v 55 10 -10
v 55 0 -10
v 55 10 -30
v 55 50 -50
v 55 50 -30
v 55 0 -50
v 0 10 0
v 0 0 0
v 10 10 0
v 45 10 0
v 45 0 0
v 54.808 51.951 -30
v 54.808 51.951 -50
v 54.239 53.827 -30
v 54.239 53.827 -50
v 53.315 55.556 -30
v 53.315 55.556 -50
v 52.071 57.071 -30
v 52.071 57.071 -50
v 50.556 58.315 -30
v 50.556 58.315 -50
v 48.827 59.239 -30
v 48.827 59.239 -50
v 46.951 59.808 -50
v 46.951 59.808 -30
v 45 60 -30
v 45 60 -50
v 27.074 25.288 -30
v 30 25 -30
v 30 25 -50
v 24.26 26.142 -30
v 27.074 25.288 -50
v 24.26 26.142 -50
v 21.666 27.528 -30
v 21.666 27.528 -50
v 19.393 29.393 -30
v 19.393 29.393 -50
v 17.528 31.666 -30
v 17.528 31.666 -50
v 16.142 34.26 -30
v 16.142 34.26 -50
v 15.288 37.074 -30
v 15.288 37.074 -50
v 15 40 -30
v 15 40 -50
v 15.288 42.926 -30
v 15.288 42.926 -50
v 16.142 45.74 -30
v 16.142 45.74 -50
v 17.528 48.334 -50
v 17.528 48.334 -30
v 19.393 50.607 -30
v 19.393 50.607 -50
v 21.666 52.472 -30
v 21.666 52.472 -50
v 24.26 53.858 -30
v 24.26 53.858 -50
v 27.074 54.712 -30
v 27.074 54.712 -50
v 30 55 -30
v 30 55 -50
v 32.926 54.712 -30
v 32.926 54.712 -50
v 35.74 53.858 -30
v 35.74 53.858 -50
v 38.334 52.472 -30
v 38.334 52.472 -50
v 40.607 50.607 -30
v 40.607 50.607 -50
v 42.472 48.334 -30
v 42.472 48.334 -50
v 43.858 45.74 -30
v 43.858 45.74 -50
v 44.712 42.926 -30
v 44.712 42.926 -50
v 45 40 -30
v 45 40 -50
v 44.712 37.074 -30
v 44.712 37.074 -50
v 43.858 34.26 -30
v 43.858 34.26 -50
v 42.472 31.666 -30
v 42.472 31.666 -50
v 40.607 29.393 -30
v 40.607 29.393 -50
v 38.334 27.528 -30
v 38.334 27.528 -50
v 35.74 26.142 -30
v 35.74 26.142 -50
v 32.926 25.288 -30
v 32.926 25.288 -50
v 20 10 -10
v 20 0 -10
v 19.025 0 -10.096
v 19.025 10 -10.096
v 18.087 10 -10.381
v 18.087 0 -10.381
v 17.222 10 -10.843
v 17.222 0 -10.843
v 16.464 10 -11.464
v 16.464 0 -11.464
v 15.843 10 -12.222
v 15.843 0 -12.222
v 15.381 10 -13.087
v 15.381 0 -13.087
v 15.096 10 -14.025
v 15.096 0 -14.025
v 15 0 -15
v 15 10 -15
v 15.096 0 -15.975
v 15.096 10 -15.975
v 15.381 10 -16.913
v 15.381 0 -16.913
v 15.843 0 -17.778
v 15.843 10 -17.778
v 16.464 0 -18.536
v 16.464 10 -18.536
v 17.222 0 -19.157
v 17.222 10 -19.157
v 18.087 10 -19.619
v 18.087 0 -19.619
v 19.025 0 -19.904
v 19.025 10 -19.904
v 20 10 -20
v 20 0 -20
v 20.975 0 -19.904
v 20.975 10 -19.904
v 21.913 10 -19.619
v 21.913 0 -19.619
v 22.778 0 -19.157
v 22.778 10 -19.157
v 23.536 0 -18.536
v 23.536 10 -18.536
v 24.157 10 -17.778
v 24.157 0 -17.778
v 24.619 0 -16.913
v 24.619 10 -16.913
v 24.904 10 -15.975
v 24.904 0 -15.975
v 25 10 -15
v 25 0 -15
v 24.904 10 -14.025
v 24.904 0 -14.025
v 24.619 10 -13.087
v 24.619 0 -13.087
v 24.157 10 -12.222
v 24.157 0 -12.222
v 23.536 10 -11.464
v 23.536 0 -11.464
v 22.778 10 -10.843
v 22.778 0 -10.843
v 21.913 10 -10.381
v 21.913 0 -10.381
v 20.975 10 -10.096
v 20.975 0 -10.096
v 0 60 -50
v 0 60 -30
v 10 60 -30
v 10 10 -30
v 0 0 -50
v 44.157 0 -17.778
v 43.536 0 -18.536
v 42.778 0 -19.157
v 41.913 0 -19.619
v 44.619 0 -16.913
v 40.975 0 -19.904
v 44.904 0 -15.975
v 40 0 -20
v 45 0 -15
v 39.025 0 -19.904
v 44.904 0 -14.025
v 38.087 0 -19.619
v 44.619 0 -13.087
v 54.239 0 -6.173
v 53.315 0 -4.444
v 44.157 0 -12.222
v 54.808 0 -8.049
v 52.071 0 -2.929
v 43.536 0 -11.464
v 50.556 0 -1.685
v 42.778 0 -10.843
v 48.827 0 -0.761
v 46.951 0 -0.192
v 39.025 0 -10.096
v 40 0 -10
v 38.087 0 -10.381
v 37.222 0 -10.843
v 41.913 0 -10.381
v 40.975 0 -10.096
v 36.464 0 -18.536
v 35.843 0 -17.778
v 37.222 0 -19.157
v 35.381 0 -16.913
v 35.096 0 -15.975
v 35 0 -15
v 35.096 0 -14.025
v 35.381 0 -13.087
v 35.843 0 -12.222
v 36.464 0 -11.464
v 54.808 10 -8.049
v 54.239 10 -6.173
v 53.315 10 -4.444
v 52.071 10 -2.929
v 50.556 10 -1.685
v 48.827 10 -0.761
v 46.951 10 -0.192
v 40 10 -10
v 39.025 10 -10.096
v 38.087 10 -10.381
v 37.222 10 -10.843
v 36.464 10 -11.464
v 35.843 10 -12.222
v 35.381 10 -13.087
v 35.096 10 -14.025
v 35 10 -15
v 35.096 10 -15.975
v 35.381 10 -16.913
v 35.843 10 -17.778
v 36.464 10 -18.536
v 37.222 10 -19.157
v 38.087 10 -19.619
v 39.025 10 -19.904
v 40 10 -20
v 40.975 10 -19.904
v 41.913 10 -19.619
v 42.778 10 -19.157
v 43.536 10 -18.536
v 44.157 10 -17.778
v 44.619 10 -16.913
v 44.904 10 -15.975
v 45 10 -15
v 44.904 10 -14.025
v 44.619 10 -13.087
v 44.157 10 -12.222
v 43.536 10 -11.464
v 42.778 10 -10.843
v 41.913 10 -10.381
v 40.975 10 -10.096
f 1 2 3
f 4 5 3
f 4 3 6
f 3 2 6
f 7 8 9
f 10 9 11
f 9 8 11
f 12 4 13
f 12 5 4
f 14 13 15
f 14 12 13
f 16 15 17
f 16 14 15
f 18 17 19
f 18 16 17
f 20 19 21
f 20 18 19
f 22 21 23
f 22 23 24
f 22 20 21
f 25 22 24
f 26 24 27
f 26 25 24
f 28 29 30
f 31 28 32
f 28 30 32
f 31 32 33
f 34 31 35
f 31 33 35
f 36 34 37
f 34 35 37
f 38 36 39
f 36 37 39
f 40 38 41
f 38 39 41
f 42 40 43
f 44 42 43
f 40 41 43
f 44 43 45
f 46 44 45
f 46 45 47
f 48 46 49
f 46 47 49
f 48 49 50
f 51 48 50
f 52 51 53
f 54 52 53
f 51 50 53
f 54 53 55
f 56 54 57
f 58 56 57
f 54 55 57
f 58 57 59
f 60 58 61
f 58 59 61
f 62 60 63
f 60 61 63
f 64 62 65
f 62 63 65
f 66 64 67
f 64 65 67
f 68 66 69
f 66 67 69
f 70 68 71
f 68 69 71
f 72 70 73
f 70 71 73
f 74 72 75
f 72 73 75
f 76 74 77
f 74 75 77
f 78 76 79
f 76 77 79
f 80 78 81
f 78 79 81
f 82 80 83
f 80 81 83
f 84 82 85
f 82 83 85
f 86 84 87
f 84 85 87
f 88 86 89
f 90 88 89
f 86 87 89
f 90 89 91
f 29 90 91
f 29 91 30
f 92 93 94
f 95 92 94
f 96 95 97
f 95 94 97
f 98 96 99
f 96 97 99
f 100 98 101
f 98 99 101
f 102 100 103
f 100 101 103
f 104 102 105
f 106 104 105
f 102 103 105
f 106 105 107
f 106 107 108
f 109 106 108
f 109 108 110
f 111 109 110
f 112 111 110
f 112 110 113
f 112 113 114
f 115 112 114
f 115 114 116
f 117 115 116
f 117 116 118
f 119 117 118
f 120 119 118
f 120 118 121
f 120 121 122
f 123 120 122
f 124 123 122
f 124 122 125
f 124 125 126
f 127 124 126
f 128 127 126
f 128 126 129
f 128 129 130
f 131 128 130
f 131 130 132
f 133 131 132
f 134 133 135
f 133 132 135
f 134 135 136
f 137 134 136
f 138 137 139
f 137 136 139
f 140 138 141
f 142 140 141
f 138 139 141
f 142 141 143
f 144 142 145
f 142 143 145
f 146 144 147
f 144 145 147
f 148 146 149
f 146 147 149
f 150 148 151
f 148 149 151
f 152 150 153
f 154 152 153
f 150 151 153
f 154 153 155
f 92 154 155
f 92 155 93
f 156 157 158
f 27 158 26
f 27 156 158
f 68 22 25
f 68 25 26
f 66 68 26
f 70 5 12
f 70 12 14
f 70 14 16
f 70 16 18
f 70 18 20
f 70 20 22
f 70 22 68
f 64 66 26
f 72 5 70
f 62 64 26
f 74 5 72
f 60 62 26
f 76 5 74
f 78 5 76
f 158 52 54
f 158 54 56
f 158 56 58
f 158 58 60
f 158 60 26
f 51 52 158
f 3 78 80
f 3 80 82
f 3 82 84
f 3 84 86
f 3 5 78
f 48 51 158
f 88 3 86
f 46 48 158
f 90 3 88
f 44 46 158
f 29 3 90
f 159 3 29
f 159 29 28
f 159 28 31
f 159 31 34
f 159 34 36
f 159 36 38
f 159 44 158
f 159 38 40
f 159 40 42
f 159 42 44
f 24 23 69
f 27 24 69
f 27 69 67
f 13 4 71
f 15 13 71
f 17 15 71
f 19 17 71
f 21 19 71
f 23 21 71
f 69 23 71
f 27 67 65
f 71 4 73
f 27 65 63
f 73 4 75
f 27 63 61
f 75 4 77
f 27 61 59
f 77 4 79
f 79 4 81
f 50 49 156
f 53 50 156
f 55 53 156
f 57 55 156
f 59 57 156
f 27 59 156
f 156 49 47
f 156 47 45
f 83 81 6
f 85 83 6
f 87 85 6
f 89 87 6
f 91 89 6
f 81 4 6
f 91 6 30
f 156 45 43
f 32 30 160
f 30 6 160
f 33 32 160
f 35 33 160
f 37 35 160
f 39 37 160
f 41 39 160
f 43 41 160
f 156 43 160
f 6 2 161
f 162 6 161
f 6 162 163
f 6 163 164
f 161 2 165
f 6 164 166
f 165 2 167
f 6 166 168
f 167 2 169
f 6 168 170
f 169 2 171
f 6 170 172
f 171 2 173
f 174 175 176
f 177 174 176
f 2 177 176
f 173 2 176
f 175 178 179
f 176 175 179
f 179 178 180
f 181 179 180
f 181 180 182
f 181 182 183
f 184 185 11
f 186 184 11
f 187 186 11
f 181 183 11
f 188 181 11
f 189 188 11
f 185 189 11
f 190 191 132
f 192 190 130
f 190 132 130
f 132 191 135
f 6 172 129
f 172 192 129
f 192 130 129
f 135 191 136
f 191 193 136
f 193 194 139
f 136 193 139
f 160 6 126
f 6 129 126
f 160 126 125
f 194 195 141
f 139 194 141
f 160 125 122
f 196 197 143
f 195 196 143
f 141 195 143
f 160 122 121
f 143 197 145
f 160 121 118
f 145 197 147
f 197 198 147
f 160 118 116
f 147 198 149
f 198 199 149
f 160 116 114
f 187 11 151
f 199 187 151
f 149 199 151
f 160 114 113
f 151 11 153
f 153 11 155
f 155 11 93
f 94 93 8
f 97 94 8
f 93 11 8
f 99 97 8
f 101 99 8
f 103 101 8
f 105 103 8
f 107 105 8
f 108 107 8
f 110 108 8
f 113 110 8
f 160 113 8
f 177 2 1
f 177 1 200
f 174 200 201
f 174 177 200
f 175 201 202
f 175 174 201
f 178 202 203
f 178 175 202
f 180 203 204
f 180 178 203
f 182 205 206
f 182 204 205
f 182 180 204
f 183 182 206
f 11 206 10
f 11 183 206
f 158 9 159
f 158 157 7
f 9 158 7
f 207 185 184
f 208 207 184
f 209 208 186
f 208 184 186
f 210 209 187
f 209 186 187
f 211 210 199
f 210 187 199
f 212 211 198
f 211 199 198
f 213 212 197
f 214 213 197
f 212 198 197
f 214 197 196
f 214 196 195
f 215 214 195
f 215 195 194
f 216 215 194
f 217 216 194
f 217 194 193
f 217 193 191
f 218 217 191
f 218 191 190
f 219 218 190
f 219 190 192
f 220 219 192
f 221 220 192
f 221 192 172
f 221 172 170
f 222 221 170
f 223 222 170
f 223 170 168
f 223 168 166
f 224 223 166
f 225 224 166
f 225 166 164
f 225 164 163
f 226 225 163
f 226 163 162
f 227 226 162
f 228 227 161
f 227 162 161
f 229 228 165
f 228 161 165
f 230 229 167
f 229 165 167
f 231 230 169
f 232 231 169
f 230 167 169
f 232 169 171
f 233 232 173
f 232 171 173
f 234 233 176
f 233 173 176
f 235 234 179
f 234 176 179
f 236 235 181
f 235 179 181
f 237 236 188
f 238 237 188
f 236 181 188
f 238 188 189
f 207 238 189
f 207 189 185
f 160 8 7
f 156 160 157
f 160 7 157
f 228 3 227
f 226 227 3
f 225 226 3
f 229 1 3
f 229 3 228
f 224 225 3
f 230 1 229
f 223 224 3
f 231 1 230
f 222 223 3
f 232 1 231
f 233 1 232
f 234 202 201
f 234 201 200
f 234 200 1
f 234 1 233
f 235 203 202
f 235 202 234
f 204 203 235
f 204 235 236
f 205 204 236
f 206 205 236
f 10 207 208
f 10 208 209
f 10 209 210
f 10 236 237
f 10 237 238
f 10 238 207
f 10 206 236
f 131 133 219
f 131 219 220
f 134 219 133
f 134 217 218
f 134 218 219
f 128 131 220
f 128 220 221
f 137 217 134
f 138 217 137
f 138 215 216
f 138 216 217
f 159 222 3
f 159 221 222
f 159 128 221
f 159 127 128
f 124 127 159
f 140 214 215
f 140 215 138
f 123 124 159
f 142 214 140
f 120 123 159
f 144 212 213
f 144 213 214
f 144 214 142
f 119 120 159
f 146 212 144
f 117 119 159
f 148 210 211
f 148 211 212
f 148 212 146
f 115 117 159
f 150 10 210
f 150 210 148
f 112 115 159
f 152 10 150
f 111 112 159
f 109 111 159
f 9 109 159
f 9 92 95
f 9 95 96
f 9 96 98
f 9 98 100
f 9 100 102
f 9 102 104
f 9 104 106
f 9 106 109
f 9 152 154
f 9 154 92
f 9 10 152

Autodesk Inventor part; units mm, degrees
ref_plane "YZ Plane" through (0, 0, 0) normal (1, 0, 0) x (0, 1, 0)
ref_plane "XZ Plane" through (0, 0, 0) normal (0, 1, 0) x (-1, 0, 0)
ref_plane "XY Plane" through (0, 0, 0) normal (0, 0, 1) x (1, 0, 0)
sketch "Szkic1" plane through (0, 0, 0) normal (0, 1, 0) x (-1, 0, 0)
  line L0 (0, 0) -> (-45, 0)
  line L1 (-55, -10) -> (-55, -50)
  line L2 (-55, -50) -> (0, -50)
  line L3 (0, -50) -> (0, 0)
  arc A0 (-45, 0) -> (-55, -10) centre (-45, -10) ccw
  point P0 (-55, 0)
  dimension "d0" = 55
  dimension "d1" = 50
  dimension "d2" = 10
extrude "Wyciągnięcie proste1" add sketch "Szkic1" along normal blind 10
sketch "Szkic2" plane through (0, 10, 0) normal (0, 1, 0) x (1, 0, 0)
  line L0 (0, 50) -> (0, 0) projected
  line L1 (0, 50) -> (55, 50)
  line L2 (55, 50) -> (55, 30)
  line L3 (55, 30) -> (0, 30)
  line L4 (0, 30) -> (0, 50)
  dimension "d5" = 55
  dimension "d6" = 20
extrude "Wyciągnięcie proste2" add sketch "Szkic2" along normal blind 50
fillet "Zaokrąglenie1" radius 10 1 edges at (55, 60, -40)
sketch "Szkic3" plane through (0, 0, 0) normal (1, 0, 0) x (0, 1, 0)
  line L0 (0, -50) -> (0, 0) projected
  line L1 (0, 0) -> (10, 0) projected
  line L2 (10, -30) -> (10, 0) projected
  line L3 (10, -30) -> (60, -30) projected
  line L4 (60, -50) -> (60, -30) projected
  line L5 (0, -50) -> (60, -50) projected
  line L6 (60, -30) -> (50, -30) projected
  line L7 (10, -30) -> (60, -30) projected
  line L8 (10, -30) -> (50, -30) projected
  line L9 (60, -30) -> (10, 0)
sketch "Szkic4" plane through (0, 0, 0) normal (1, 0, 0) x (0, 1, 0)
  line L0 (60, -50) -> (60, -30) projected
  line L1 (10, -30) -> (50, -30) projected
  line L2 (60, -30) -> (10, -30)
  line L3 (10, -10) -> (10, 0) projected
  line L4 (10, -30) -> (10, 0)
  point P0 (0, 0)
extrude "Wyciągnięcie proste3" add sketch "Szkic3" along normal blind 10 contours L9 L3 L2
sketch "Szkic5" plane through (55, 10, -30) normal (0, 0, 1) x (1, 0, 0)
  line L0 (0, 0) -> (0, 40) projected
  line L1 (-45, 0) -> (-10, 0) projected
  point P0 (-55, -10)
  point P1 (-25, 30)
  dimension "d12" = 25
  dimension "d13" = 30
hole "Otwór1" at (30, 40, -30) direction (0, 0, -1) diameter 30 end through all
sketch "Szkic6" plane through (0, 10, 0) normal (0, 1, 0) x (1, 0, 0)
  line L0 (10, 30) -> (10, 0) projected
  line L1 (10, 30) -> (45, 30) projected
  point P0 (0, 0)
  point P1 (40, 15)
  point P2 (20, 15)
  dimension "d21" = 10
  dimension "d22" = 20
  dimension "d23" = 15
hole "Otwór2" at (20, 10, -15) at (40, 10, -15) direction (0, -1, 0) diameter 10 end through all
